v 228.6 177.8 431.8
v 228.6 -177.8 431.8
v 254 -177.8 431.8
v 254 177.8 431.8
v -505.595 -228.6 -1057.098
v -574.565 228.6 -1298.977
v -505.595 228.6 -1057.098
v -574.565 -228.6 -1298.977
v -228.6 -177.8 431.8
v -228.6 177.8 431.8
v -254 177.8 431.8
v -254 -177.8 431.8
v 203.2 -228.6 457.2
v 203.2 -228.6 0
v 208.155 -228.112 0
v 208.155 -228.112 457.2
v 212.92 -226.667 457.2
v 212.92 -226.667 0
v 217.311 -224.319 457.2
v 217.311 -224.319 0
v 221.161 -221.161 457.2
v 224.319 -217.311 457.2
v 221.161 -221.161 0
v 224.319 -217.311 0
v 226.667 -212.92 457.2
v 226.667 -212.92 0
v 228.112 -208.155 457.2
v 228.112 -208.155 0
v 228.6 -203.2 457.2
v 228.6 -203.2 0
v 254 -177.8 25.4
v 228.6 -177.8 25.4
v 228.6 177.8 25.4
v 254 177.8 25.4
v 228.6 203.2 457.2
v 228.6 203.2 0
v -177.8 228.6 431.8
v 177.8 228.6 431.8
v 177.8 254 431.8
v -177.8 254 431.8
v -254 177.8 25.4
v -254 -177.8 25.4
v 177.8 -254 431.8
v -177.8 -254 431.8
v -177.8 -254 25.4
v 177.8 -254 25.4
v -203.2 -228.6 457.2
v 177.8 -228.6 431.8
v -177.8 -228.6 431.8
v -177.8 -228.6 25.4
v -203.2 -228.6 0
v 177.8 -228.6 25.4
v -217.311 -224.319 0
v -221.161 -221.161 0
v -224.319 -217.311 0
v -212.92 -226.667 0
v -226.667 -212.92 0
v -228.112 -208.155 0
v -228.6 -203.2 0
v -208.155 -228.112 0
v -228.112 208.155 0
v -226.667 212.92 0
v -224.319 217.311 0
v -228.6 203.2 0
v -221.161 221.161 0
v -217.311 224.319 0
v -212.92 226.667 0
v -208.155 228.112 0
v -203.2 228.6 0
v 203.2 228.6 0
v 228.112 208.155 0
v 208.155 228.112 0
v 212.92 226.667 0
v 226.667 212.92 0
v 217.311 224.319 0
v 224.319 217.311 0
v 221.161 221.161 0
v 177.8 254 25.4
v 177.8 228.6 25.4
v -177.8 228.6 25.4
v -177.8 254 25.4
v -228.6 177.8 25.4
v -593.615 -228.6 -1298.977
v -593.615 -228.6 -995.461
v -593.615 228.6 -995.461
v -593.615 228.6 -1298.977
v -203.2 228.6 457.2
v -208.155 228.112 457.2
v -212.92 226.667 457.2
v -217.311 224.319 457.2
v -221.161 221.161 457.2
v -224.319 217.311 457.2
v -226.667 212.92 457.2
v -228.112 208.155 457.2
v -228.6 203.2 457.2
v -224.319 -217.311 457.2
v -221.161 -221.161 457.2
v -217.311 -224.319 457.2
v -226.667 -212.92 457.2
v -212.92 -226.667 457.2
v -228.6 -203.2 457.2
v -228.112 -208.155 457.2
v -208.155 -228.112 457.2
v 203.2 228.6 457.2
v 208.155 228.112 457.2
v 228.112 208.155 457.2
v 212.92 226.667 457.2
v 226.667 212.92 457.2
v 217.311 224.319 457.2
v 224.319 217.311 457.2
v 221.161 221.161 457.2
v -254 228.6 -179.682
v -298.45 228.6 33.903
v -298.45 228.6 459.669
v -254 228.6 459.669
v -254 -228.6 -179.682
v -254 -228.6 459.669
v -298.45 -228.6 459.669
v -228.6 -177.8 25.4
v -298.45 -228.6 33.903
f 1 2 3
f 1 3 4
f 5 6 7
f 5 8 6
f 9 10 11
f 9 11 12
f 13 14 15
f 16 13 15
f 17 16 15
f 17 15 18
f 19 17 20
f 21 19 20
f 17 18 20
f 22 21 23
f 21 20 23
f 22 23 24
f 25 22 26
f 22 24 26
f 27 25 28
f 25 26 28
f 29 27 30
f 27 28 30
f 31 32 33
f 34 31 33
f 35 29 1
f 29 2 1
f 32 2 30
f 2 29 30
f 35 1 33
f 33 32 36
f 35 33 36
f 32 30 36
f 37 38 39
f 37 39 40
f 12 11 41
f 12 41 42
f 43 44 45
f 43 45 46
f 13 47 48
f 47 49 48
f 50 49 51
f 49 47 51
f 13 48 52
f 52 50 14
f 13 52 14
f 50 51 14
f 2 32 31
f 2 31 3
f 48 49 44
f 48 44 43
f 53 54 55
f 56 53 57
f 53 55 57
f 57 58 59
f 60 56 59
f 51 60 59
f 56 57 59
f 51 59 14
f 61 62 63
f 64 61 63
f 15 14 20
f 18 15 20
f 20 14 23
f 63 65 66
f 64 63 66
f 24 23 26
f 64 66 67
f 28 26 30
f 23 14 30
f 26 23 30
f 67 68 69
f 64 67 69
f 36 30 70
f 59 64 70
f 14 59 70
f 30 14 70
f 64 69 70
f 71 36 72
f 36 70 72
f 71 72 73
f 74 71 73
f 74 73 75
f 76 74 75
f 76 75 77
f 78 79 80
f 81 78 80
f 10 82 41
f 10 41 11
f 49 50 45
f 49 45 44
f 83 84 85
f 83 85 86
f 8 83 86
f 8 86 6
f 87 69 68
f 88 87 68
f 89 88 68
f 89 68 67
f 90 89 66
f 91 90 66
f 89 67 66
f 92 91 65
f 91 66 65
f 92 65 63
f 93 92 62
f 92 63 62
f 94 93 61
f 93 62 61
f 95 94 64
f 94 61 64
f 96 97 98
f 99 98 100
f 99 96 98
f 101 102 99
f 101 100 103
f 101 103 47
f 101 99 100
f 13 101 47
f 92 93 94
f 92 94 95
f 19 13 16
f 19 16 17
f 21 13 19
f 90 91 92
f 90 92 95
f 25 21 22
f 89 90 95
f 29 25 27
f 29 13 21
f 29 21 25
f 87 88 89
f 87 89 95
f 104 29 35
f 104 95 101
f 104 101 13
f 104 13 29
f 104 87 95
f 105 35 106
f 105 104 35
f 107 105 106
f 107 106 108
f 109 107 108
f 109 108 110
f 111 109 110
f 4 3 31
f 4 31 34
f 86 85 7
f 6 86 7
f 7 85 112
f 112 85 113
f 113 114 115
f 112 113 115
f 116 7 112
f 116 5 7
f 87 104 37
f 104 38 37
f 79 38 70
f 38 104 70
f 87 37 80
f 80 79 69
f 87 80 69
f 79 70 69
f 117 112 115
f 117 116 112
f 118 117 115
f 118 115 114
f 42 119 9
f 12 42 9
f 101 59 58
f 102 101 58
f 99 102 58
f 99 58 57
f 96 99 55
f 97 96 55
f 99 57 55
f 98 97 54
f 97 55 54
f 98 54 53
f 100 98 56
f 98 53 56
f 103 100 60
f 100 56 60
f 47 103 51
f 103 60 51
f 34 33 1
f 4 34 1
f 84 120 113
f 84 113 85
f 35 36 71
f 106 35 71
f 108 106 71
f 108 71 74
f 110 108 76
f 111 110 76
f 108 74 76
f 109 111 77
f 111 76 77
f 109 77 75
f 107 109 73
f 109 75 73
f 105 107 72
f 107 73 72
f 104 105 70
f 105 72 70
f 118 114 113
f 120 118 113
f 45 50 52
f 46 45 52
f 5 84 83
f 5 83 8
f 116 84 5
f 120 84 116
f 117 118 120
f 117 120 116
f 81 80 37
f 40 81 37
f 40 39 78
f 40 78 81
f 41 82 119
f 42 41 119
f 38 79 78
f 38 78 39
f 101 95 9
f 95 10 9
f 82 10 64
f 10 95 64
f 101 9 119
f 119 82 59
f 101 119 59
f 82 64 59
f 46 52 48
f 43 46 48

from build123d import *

# Parameters (mm, degrees)
F1_DEPTH  = 457.2
F2_W      = 355.6
F2_H      = 406.4
F3_DEPTH  = 25.4
F4_W      = 355.6
F4_H      = 406.4
F5_DEPTH  = 25.4
F6_W      = 355.6
F6_H      = 406.4
F7_DEPTH  = 25.4
F8_W      = 355.6
F8_H      = 406.4
F9_DEPTH  = 25.4
F11_DEPTH = 228.6


# Not quite as in the source:
# - a feature of the source that left no trace in its solid (it failed there, or was rolled back) is left out


with BuildPart() as f1:
    # F0 (on Top) → F1 (new body)
    with BuildSketch(Plane.XY):
        with BuildLine():
            ThreePointArc((-228.6, -203.2), (-221.1605122421, -221.1605122421), (-203.2, -228.6))
            Line((-203.2, -228.6), (203.2, -228.6))
            ThreePointArc((203.2, -228.6), (221.1605122421, -221.1605122421), (228.6, -203.2))
            Line((228.6, -203.2), (228.6, 203.2))
            ThreePointArc((228.6, 203.2), (221.1605122421, 221.1605122421), (203.2, 228.6))
            Line((203.2, 228.6), (-203.2, 228.6))
            ThreePointArc((-203.2, 228.6), (-221.1605122421, 221.1605122421), (-228.6, 203.2))
            Line((-228.6, 203.2), (-228.6, -203.2))
        make_face()
    extrude(amount=F1_DEPTH)

    # F2 (on face) → F3 (join)
    with BuildSketch(Plane.YZ.offset(228.6)):
        with Locations((0, 228.6)):
            Rectangle(F2_W, F2_H)
    extrude(amount=F3_DEPTH)

    # F4 (on face) → F5 (join)
    with BuildSketch(Plane.XZ.offset(228.6)):
        with Locations((0, 228.6)):
            Rectangle(F4_W, F4_H)
    extrude(amount=F5_DEPTH)

    # F6 (on face) → F7 (join)
    with BuildSketch(Plane(origin=(-228.6, 0, 0), x_dir=(0, -1, 0), z_dir=(-1, 0, 0))):
        with Locations((0, 228.6)):
            Rectangle(F6_W, F6_H)
    extrude(amount=F7_DEPTH)

    # F8 (on face) → F9 (join)
    with BuildSketch(Plane(origin=(0, 228.6, 0), x_dir=(-1, 0, 0), z_dir=(0, 1, 0))):
        with Locations((0, 228.6)):
            Rectangle(F8_W, F8_H)
    extrude(amount=F9_DEPTH)


with BuildPart() as f11:
    # F10 (on Front) → F11 (new body, symmetric)
    with BuildSketch(Plane.XZ):
        Polygon((-254, -179.6818675809), (-254, 459.6689861676), (-298.45, 459.6689861676), (-298.45, 33.9028166904), (-593.6153675181, -995.4611493138), (-593.6153675181, -1298.9769535385), (-574.5653675181, -1298.9769535385), (-505.5949514657, -1057.0977353197), align=None)
    extrude(amount=F11_DEPTH, both=True)


solid = Compound([f1.part, f11.part])
